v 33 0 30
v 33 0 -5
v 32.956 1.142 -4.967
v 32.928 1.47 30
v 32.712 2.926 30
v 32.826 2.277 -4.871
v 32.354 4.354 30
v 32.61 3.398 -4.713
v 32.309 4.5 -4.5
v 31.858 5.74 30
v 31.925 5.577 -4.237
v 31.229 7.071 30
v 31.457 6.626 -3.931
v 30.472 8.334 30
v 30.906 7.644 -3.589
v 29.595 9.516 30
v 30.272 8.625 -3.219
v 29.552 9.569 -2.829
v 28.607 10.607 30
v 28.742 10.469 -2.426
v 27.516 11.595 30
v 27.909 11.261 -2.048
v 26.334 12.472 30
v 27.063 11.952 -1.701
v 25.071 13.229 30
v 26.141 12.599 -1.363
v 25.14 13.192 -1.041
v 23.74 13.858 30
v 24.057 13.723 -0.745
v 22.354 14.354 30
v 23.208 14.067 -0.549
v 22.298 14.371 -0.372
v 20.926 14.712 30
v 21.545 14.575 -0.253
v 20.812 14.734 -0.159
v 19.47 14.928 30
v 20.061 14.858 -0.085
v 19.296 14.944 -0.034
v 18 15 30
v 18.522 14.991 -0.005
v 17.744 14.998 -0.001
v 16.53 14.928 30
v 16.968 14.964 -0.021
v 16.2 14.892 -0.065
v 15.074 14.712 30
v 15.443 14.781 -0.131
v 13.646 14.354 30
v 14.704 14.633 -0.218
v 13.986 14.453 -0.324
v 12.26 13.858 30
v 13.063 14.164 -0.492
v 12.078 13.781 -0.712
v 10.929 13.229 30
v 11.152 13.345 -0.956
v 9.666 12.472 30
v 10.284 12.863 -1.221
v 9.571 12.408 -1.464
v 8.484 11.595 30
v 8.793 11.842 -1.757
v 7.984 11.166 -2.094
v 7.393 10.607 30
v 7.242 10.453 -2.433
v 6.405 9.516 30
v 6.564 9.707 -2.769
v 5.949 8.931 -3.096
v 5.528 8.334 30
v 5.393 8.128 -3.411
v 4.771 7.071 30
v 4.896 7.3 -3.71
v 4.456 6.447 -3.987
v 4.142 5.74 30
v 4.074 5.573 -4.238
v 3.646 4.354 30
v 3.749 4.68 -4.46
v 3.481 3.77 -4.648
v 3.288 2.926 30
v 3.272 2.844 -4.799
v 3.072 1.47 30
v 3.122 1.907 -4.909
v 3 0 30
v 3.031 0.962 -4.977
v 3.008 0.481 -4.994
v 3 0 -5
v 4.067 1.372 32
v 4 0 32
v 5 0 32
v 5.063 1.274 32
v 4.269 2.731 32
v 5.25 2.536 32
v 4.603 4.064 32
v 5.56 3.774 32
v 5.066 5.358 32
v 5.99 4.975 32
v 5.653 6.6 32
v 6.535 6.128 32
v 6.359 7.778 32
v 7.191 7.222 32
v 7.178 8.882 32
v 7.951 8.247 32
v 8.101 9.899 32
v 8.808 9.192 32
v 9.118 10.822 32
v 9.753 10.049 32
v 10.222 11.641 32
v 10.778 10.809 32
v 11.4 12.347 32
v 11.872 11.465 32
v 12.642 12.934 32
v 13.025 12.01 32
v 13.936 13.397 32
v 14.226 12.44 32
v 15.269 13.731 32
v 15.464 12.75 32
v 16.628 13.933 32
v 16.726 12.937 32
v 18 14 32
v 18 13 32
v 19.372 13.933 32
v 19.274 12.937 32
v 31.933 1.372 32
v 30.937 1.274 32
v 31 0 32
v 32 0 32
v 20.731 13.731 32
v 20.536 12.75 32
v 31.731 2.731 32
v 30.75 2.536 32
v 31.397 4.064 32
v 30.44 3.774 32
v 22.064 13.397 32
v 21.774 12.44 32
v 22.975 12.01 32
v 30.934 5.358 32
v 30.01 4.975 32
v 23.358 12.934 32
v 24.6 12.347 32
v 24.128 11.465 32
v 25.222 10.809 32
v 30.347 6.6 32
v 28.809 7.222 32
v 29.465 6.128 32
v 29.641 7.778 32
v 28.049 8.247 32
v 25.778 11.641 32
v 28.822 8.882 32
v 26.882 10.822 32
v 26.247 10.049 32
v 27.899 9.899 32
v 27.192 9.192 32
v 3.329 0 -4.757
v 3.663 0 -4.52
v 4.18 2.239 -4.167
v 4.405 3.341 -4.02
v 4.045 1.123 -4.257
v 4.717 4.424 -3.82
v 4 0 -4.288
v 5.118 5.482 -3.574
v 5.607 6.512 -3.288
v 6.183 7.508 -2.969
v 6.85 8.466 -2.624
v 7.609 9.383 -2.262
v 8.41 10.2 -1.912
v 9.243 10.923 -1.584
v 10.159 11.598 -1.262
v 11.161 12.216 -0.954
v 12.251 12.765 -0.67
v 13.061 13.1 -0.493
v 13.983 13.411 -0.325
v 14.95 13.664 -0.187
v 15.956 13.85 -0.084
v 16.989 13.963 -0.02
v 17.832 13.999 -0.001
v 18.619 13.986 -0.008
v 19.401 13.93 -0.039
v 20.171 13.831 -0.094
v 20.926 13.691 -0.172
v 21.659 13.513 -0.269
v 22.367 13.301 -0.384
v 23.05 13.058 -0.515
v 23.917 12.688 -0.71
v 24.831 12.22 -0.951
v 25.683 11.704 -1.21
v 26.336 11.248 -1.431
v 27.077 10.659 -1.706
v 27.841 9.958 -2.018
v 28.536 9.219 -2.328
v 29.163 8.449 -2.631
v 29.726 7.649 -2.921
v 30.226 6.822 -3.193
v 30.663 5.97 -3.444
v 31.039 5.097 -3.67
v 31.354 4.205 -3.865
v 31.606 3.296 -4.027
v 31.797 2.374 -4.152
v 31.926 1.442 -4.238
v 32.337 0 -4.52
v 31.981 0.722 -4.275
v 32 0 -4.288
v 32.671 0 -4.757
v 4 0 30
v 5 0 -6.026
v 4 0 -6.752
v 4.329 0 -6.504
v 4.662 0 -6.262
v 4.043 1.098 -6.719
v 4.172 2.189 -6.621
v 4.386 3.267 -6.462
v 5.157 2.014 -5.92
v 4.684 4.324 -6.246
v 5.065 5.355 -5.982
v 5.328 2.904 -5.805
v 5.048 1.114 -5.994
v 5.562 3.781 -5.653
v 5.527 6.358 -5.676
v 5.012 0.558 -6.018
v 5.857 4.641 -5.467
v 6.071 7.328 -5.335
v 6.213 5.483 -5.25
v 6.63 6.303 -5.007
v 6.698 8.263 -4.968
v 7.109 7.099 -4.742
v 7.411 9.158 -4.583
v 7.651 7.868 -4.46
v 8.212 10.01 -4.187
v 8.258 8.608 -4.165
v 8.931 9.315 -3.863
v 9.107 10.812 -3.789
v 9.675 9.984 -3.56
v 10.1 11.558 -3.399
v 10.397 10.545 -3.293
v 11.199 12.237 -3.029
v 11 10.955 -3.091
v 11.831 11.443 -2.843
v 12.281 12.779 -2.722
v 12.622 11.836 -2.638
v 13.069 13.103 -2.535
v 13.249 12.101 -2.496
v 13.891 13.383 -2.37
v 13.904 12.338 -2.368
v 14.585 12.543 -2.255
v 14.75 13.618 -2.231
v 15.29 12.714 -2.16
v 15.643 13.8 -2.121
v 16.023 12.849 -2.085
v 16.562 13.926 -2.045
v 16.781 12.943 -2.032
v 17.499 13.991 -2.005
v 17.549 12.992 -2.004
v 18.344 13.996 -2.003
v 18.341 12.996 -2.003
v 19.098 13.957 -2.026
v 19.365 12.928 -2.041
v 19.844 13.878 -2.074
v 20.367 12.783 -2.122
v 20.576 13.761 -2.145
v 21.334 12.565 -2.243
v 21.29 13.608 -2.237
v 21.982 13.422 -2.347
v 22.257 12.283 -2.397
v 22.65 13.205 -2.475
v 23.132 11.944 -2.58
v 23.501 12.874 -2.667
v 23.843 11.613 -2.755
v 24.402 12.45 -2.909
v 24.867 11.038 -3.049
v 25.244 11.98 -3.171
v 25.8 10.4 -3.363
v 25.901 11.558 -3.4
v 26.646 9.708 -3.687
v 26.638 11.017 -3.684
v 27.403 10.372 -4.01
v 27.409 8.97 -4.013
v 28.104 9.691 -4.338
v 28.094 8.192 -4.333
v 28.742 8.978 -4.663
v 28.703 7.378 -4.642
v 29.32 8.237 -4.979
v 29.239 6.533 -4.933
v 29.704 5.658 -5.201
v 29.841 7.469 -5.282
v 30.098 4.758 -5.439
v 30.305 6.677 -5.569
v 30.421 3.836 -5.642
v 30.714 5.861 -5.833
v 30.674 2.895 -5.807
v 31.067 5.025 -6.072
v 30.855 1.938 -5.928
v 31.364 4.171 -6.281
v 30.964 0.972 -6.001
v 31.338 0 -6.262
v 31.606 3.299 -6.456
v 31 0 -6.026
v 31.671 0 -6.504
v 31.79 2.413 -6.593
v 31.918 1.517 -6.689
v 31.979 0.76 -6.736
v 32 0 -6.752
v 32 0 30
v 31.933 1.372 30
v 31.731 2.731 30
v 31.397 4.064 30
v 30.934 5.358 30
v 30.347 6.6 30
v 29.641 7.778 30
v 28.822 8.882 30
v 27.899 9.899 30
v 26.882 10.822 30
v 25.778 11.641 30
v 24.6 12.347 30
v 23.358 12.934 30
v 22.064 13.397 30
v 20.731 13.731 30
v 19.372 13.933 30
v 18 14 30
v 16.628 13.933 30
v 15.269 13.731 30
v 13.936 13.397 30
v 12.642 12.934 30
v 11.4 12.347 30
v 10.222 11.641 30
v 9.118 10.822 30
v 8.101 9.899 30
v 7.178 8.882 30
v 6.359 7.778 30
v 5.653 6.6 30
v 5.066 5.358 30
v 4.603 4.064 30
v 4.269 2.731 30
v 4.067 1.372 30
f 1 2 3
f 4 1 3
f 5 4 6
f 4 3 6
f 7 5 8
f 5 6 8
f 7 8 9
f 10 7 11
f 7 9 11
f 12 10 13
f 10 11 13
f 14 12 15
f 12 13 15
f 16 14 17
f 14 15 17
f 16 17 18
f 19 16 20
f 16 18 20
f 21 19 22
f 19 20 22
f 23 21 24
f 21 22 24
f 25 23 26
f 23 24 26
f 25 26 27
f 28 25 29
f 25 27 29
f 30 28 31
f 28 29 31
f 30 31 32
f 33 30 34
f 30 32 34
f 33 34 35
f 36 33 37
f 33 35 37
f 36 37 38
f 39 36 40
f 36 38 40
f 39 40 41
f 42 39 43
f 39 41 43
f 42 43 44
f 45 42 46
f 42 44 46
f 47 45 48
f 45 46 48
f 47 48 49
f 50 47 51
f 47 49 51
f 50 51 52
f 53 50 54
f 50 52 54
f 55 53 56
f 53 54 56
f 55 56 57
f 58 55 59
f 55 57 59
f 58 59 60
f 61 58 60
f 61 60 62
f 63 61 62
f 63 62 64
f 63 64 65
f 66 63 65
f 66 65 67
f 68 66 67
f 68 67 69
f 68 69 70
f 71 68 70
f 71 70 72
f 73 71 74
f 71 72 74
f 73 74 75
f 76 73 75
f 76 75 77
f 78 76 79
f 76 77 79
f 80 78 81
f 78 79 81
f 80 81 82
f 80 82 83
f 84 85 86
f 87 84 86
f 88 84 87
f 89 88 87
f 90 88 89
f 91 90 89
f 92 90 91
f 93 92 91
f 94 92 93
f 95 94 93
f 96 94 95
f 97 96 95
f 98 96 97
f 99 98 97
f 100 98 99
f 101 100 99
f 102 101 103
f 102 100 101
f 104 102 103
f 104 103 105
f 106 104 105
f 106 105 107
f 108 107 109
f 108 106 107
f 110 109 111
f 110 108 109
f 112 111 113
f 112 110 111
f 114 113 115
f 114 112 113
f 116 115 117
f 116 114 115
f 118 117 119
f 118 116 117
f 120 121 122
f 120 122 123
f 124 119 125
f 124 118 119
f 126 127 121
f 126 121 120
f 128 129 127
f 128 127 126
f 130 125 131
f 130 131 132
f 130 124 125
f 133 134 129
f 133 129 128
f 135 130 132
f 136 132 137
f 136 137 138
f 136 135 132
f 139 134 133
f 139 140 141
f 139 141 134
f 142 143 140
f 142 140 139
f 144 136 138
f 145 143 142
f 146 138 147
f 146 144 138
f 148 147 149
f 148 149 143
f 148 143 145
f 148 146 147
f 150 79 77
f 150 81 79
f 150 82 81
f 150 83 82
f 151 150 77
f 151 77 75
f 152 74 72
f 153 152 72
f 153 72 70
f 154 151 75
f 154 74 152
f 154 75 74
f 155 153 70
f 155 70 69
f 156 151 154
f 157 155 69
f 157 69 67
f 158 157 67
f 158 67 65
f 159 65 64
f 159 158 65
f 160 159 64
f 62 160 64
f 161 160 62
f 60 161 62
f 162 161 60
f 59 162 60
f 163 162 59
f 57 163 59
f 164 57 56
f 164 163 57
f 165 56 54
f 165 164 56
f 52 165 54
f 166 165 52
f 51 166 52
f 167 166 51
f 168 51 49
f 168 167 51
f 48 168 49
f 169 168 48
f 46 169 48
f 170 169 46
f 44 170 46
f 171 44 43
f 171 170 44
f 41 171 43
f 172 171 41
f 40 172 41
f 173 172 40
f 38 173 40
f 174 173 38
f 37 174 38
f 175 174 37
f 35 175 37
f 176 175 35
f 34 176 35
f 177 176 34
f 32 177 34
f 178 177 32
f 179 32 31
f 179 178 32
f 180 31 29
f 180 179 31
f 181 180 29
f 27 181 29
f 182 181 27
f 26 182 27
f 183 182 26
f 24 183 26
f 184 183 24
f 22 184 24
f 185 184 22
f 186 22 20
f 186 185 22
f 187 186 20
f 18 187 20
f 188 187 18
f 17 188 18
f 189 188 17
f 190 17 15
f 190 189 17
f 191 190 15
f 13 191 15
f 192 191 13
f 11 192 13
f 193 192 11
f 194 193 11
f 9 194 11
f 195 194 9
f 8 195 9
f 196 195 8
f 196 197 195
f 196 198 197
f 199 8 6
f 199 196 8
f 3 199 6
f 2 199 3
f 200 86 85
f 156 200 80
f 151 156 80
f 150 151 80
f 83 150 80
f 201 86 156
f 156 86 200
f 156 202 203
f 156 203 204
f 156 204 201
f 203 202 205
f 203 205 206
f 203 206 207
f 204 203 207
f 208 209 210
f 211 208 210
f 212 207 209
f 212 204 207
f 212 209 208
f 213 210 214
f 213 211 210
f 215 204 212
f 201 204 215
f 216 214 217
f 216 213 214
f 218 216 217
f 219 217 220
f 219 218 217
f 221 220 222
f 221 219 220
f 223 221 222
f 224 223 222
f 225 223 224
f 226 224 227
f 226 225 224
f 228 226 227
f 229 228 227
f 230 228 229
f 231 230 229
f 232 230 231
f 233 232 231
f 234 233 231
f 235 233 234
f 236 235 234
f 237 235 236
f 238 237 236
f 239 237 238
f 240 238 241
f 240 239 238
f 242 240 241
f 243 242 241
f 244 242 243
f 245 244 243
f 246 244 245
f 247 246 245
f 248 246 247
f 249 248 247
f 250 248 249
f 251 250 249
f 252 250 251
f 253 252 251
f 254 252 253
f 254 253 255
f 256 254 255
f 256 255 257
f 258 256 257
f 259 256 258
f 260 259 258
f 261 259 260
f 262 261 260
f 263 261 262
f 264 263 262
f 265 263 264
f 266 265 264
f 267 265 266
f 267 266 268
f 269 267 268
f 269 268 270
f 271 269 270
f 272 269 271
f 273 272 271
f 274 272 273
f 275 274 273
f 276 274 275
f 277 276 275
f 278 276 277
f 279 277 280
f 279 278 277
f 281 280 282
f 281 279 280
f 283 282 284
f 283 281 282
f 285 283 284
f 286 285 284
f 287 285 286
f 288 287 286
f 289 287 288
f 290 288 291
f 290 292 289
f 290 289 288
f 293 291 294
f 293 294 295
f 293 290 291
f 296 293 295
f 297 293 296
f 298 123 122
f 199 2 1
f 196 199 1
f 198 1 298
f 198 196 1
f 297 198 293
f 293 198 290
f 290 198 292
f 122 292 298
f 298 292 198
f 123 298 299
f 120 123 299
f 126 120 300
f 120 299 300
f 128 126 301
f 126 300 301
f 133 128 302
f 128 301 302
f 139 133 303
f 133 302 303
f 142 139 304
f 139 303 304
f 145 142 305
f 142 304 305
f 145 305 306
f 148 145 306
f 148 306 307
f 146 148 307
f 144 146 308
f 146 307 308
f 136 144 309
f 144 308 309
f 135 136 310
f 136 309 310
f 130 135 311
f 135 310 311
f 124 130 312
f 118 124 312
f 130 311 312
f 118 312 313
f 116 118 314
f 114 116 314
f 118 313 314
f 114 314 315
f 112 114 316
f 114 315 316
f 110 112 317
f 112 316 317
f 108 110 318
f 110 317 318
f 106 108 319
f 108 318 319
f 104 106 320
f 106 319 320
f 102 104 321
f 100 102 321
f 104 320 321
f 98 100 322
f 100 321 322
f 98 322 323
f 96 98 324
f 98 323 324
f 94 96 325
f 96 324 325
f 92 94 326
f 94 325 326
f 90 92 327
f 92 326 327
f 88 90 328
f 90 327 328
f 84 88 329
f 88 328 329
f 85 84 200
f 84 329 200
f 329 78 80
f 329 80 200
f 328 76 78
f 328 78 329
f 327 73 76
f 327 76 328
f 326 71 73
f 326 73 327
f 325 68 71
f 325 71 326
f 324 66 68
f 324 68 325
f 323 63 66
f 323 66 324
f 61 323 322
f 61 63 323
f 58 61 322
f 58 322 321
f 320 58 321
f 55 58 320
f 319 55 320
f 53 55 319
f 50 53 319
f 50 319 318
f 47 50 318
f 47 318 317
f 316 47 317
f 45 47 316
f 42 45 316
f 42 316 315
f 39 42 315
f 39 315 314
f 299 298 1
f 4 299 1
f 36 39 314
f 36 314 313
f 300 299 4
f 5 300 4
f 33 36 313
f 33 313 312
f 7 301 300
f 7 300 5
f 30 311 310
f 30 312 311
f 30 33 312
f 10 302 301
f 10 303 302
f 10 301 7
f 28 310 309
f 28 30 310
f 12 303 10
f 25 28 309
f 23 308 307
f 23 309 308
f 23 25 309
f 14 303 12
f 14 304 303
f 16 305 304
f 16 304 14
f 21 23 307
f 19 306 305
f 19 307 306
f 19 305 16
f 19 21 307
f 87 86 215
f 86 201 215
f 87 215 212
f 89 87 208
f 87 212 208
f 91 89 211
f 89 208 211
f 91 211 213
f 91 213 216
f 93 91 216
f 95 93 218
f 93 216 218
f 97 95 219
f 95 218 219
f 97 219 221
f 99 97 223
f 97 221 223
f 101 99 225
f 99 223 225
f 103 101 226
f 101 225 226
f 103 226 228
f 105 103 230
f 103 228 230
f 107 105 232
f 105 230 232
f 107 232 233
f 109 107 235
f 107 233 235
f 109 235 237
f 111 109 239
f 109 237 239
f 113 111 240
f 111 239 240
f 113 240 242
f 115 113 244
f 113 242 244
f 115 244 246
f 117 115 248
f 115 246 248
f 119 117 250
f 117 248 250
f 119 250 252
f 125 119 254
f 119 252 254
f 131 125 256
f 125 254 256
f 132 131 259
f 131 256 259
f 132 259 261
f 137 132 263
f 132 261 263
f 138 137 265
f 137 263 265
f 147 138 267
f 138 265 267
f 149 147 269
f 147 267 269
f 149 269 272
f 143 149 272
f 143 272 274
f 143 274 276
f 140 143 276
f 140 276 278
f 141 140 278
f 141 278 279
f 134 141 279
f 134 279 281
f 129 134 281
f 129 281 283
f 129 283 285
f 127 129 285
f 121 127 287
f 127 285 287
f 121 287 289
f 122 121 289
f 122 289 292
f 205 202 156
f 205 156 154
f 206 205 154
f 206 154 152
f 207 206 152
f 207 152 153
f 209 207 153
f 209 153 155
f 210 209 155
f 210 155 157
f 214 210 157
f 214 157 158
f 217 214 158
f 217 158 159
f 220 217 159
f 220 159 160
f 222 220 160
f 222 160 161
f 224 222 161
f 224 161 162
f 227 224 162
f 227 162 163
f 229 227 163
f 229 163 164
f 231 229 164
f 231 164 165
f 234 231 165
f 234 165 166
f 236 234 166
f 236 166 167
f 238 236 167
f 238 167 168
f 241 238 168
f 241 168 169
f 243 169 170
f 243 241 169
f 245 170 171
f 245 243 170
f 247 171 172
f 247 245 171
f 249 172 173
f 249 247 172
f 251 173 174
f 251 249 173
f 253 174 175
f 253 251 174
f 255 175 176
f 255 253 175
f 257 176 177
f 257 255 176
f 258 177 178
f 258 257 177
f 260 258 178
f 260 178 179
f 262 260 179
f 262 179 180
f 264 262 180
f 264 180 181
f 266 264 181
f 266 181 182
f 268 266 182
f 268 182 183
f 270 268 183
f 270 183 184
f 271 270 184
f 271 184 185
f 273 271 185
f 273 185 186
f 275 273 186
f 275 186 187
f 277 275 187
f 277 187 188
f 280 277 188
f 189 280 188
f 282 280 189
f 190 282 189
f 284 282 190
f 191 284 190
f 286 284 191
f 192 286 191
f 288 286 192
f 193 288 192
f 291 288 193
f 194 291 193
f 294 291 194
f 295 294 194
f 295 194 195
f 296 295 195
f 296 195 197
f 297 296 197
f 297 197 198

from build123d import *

# Parameters (mm, degrees)
BOSS_EXTRUDE1_DEPTH = 30
BOSS_EXTRUDE2_START = -30
BOSS_EXTRUDE2_DEPTH = 30
SKETCH4_R           = 25
CUT_EXTRUDE2_DEPTH  = 30
BOSS_EXTRUDE3_DEPTH = 2
BOSS_EXTRUDE4_START = -10
BOSS_EXTRUDE4_DEPTH = 10
SKETCH7_R           = 23
CUT_EXTRUDE4_DEPTH  = 27


with BuildPart() as part:
    # Sketch2 → Boss-Extrude1 (new body)
    with BuildSketch(Plane.XY):
        with BuildLine():
            Line((3, 0), (5, 0))
            ThreePointArc((5, 0), (18, 13), (31, 0))
            Line((31, 0), (33, 0))
            ThreePointArc((33, 0), (18, 15), (3, 0))
        make_face()
    extrude(amount=BOSS_EXTRUDE1_DEPTH)

    # Sketch3 → Boss-Extrude2 (add)
    with BuildSketch(Plane.XY.offset(BOSS_EXTRUDE2_START)):
        with BuildLine():
            Line((3, 0), (5, 0))
            ThreePointArc((5, 0), (18, 13), (31, 0))
            Line((31, 0), (33, 0))
            ThreePointArc((33, 0), (18, 15), (3, 0))
        make_face()
    extrude(amount=BOSS_EXTRUDE2_DEPTH)

    # Sketch4 → Cut-Extrude2 (cut)
    with BuildSketch(Plane(origin=(0, 0, 0), x_dir=(1, 0, 0), z_dir=(0, 1, 0))):
        with Locations((18, 25)):
            Circle(SKETCH4_R)
    extrude(amount=CUT_EXTRUDE2_DEPTH, mode=Mode.SUBTRACT)

    # Sketch5 → Boss-Extrude3 (add)
    with BuildSketch(Plane.XY.offset(30)):
        with BuildLine():
            Line((4, 0), (5, 0))
            ThreePointArc((5, 0), (18, 13), (31, 0))
            Line((31, 0), (32, 0))
            ThreePointArc((32, 0), (18, 14), (4, 0))
        make_face()
    extrude(amount=BOSS_EXTRUDE3_DEPTH)

    # Sketch6 → Boss-Extrude4 (add)
    with BuildSketch(Plane.XY.offset(BOSS_EXTRUDE4_START)):
        with BuildLine():
            Line((5, 0), (4, 0))
            ThreePointArc((4, 0), (18, 14), (32, 0))
            Line((32, 0), (31, 0))
            ThreePointArc((31, 0), (18, 13), (5, 0))
        make_face()
    extrude(amount=BOSS_EXTRUDE4_DEPTH)

    # Sketch7 → Cut-Extrude4 (cut)
    with BuildSketch(Plane(origin=(0, 0, 0), x_dir=(1, 0, 0), z_dir=(0, 1, 0))):
        with Locations((18, 25)):
            Circle(SKETCH7_R)
    extrude(amount=CUT_EXTRUDE4_DEPTH, mode=Mode.SUBTRACT)


solid = part.part
